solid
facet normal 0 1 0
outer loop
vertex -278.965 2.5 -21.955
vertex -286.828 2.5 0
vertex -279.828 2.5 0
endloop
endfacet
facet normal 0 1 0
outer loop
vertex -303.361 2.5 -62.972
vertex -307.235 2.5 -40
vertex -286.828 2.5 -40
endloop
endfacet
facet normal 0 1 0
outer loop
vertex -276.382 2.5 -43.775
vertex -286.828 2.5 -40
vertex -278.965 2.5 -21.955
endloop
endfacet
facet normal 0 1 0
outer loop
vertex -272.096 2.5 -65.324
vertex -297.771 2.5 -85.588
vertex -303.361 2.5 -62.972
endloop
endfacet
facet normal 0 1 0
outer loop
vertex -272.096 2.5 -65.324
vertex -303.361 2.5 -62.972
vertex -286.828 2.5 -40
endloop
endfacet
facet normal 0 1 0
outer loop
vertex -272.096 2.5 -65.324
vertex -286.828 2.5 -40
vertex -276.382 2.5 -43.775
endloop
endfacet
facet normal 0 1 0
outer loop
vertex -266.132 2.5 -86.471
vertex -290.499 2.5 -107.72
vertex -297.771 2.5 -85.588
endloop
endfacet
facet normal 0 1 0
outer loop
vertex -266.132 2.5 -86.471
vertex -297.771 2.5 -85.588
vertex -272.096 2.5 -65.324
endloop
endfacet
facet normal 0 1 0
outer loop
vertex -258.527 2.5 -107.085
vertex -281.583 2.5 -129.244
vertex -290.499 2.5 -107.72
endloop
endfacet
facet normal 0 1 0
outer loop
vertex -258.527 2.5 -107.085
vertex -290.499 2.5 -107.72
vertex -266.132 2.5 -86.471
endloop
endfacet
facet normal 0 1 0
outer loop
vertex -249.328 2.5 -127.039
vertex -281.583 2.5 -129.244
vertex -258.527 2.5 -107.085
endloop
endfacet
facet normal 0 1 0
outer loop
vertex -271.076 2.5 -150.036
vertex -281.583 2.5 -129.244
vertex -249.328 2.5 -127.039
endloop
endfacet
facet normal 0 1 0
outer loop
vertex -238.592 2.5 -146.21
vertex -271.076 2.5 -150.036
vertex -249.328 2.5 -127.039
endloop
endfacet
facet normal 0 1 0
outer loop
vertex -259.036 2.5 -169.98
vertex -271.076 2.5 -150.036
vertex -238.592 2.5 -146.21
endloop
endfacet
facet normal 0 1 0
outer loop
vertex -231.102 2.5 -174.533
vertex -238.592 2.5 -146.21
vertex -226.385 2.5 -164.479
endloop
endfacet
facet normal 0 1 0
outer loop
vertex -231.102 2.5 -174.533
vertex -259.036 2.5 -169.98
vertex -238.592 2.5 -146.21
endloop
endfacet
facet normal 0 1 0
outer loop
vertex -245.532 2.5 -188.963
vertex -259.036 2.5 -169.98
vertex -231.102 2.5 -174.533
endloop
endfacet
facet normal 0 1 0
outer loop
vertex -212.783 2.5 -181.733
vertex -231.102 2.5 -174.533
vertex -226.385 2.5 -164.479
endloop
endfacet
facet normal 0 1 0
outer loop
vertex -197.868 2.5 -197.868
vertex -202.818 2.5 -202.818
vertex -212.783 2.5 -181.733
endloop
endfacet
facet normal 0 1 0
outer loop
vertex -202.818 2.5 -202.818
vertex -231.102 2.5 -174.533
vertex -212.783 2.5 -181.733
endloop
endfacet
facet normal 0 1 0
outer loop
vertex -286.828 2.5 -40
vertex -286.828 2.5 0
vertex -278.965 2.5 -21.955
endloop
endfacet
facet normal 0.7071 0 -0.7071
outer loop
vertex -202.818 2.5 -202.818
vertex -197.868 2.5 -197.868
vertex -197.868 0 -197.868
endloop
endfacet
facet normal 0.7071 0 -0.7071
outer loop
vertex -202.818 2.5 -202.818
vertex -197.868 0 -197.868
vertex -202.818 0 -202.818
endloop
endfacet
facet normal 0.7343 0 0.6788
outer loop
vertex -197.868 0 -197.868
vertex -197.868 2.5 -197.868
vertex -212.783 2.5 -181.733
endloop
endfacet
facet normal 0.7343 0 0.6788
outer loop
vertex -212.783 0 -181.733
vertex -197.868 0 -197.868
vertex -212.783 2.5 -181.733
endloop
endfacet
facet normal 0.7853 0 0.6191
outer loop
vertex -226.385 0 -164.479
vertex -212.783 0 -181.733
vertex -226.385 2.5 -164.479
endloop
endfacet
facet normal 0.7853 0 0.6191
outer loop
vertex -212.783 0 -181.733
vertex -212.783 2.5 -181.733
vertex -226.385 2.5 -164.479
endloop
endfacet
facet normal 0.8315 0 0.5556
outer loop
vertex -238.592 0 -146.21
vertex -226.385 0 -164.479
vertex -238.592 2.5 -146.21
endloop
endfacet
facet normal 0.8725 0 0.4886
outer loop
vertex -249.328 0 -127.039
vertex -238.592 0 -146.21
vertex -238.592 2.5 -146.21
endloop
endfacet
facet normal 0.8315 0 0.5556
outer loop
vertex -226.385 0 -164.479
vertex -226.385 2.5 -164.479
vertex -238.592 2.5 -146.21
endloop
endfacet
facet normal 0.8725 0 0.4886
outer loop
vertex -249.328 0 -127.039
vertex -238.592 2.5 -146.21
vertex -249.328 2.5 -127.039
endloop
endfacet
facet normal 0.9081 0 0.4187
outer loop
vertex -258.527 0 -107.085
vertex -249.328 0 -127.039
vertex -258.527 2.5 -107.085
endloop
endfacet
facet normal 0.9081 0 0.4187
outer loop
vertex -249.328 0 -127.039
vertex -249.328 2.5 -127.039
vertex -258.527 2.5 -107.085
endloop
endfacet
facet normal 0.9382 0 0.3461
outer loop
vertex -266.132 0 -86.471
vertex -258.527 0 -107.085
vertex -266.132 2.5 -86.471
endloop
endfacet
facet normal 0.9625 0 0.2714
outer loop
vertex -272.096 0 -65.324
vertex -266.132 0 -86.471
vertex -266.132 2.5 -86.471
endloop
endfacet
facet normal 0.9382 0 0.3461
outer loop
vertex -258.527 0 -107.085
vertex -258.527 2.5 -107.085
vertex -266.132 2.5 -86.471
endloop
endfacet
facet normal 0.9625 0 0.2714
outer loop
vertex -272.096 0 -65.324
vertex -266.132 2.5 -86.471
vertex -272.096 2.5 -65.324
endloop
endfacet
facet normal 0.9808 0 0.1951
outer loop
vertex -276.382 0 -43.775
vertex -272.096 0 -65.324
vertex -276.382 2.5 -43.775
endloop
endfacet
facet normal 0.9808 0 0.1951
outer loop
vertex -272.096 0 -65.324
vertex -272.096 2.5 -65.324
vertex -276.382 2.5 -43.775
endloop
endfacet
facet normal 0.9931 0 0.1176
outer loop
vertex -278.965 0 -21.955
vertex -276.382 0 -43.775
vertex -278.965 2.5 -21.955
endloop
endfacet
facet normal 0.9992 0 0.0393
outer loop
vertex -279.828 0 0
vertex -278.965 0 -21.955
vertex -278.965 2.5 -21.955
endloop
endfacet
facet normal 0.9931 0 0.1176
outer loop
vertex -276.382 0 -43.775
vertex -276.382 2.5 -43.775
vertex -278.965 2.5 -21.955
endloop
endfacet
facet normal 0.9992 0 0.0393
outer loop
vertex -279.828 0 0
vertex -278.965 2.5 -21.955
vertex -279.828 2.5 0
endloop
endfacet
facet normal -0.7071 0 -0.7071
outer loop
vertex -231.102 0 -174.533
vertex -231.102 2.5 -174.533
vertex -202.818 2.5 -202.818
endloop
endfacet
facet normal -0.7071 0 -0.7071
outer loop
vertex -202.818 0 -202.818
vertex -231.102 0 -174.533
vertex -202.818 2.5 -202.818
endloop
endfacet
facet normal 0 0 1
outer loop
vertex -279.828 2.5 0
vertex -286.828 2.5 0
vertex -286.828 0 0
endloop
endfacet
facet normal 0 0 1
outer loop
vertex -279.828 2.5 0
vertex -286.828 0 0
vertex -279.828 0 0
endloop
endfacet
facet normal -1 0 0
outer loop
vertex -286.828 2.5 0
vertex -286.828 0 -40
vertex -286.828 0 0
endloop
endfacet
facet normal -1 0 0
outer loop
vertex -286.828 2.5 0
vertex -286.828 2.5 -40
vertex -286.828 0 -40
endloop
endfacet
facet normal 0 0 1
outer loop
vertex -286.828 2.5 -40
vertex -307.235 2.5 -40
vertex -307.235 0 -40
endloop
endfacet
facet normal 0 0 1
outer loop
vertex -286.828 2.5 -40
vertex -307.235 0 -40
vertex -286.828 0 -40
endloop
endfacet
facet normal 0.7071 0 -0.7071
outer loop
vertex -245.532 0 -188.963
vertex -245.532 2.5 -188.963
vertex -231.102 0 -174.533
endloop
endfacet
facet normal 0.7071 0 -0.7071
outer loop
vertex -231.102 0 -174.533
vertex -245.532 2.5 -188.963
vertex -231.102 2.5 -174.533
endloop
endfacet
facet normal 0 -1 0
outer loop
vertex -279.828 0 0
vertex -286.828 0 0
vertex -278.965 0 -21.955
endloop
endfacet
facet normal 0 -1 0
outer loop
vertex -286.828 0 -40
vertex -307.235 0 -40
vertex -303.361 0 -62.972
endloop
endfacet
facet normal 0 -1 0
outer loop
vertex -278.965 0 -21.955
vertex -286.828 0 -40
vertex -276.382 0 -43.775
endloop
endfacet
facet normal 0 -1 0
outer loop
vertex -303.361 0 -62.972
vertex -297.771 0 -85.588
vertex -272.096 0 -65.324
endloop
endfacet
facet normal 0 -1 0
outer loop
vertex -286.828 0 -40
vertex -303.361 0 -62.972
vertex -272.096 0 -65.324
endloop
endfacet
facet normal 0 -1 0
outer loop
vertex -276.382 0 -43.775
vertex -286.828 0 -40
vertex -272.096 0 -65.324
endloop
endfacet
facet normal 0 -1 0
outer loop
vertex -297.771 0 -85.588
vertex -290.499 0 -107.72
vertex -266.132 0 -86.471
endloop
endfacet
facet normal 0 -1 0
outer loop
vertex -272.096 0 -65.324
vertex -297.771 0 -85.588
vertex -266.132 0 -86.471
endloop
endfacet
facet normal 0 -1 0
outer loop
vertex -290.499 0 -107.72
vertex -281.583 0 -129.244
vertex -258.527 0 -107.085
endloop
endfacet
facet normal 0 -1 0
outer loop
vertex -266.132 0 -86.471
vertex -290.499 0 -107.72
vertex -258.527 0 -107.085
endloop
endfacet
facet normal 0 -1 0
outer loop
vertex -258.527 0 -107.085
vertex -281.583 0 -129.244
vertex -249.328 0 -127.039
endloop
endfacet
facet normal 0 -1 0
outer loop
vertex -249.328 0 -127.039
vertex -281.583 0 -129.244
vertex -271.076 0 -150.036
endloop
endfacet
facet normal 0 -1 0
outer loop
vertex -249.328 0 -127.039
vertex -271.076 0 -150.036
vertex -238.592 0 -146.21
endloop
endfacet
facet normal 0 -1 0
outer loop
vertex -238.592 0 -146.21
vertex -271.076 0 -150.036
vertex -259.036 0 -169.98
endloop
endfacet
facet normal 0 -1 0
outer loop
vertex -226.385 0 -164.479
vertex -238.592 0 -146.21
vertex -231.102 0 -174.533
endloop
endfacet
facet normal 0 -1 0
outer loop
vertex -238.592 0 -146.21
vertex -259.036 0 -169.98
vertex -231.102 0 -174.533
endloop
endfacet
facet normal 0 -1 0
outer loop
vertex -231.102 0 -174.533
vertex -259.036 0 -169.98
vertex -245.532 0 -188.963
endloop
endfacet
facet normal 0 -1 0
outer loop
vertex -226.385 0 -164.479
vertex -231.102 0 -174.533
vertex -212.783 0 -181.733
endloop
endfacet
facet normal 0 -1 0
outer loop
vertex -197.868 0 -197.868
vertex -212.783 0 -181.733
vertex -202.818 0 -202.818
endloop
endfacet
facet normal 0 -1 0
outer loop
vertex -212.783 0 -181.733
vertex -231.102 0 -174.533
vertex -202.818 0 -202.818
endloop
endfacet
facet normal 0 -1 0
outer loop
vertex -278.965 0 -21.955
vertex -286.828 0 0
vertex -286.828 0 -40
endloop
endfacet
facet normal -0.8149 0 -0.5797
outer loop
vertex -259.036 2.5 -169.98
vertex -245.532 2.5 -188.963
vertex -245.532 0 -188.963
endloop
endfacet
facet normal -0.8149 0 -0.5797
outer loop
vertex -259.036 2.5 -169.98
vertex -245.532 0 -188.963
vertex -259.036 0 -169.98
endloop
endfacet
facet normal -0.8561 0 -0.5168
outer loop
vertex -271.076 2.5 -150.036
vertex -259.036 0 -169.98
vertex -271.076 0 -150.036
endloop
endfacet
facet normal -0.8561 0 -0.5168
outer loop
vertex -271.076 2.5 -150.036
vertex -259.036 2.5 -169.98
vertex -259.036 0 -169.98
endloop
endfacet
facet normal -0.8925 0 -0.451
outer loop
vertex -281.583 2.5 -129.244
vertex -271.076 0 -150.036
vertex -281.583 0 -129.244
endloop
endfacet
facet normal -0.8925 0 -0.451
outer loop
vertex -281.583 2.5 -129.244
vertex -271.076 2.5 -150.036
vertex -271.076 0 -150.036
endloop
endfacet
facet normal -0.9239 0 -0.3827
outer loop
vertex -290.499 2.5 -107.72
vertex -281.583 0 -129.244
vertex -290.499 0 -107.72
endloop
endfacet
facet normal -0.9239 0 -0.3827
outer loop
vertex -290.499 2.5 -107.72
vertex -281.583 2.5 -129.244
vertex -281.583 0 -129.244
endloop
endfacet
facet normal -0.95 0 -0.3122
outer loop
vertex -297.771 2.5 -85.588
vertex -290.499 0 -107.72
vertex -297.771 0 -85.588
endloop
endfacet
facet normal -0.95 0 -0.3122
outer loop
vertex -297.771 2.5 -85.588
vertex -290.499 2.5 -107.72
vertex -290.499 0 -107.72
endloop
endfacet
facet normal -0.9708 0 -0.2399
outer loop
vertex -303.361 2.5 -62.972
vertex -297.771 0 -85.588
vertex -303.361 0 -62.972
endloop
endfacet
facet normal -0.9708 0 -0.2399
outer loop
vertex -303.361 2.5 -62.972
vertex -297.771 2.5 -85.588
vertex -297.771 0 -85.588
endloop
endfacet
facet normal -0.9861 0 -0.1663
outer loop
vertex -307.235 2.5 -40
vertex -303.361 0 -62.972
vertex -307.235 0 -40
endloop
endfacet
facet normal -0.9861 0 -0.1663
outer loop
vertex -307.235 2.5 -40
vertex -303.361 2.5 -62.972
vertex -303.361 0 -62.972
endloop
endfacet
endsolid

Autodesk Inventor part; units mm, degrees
ref_plane "YZ Plane" through (0, 0, 0) normal (1, 0, 0) x (0, 1, 0)
ref_plane "XZ Plane" through (0, 0, 0) normal (0, 1, 0) x (-1, 0, 0)
ref_plane "XY Plane" through (0, 0, 0) normal (0, 0, 1) x (1, 0, 0)
sketch "スケッチ1" plane through (0, 0, 0) normal (0, 1, 0) x (-1, 0, 0)
  circle A0 centre (0, 0) radius 178.1675
  circle A1 centre (0, 0) radius 157.8276
  line L0 (168.1877, 0) -> (166.7488, -21.9529)
  line L1 (168.1877, 0) -> (130.1721, 2.4917) construction
  line L2 (249.4344, 0) -> (-249.4344, 0) projected
  line L3 (166.7488, -21.9529) -> (156.7702, -21.2989)
  line L4 (156.7702, -21.2989) -> (158.2091, 0.654) construction
  line L5 (158.2091, 0.654) -> (168.1877, 0)
  line L6 (157.4896, -10.3224) -> (0, 0)
  line L7 (166.7488, -21.9529) -> (162.4568, -43.5302)
  line L8 (162.4568, -43.5302) -> (152.649, -41.5793) construction
  line L9 (152.649, -41.5793) -> (156.9409, -20.002) construction
  line L10 (156.9409, -20.002) -> (166.7488, -21.9529) construction
  line L11 (162.4568, -43.5302) -> (155.3851, -64.3626)
  line L12 (155.3851, -64.3626) -> (145.9158, -61.1482) construction
  line L13 (145.9158, -61.1482) -> (152.9875, -40.3158) construction
  line L14 (152.9875, -40.3158) -> (162.4568, -43.5302) construction
  line L15 (155.3851, -64.3626) -> (145.6548, -84.0938)
  line L16 (145.6548, -84.0938) -> (136.6861, -79.6709) construction
  line L17 (136.6861, -79.6709) -> (146.4164, -59.9397) construction
  line L18 (146.4164, -59.9397) -> (155.3851, -64.3626) construction
  line L19 (0, 0) -> (111.6009, -111.6009)
  line L20 (145.6548, -84.0938) -> (137.3401, -78.5381) construction
  line L21 (137.3401, -78.5381) -> (125.1176, -96.8305) construction
  line L22 (125.1176, -96.8305) -> (133.4323, -102.3862) construction
  line L23 (133.4323, -102.3862) -> (145.6548, -84.0938)
  line L24 (133.4323, -102.3862) -> (125.9139, -95.7927) construction
  line L25 (125.9139, -95.7927) -> (111.4082, -112.3332) construction
  line L26 (111.4082, -112.3332) -> (118.9266, -118.9266)
  line L27 (118.9266, -118.9266) -> (133.4323, -102.3862)
  line L28 (111.6009, -111.6009) -> (118.9266, -118.9266)
  line L29 (166.7488, -21.9529) -> (176.7274, -22.6069) construction
  line L30 (118.9266, -118.9266) -> (125.9834, -125.9834)
  point P0 (154.795, -30.7906)
  point P1 (149.4517, -50.732)
  point P2 (141.5512, -69.8053)
  point P3 (131.2288, -87.6843)
  point P4 (118.661, -104.0629)
  point P5 (157.8276, 0)
  point P6 (178.1675, 0)
  dimension "d0" = 22
  dimension "d1" = 10
  dimension "d2" = 45
  dimension "d4" = 315.6551
extrude "押し出し1" add sketch "スケッチ1" along normal blind 2.5 contours L30 L27 L23 L15 L11 L7 L0 L2 A0 | L28 A1 L2 L0 L7 L11 L15 L23 L27
sketch "スケッチ2" plane through (0, 2.5, 0) normal (0, 1, 0) x (1, 0, 0)
  circle A0 centre (0, 0) radius 309.8276
  line L0 (-168.1877, 0) -> (-166.7488, 21.9529) projected
  line L1 (-166.7488, 21.9529) -> (-162.4568, 43.5302) projected
  line L2 (-162.4568, 43.5302) -> (-155.3851, 64.3626) projected
  line L3 (-155.3851, 64.3626) -> (-145.6548, 84.0938) projected
  line L4 (-133.4323, 102.3862) -> (-145.6548, 84.0938) projected
  line L5 (-118.9266, 118.9266) -> (-133.4323, 102.3862) projected
  line L6 (-167.4682, 10.9764) -> (-166.0294, 32.9293)
  line L7 (-166.0294, 32.9293) -> (-275.7938, 40.1237)
  line L8 (-275.7938, 40.1237) -> (-277.2327, 18.1708)
  line L9 (-277.2327, 18.1708) -> (-167.4682, 10.9764)
  line L10 (-164.6028, 32.7415) -> (-160.3108, 54.3188)
  line L11 (-160.3108, 54.3188) -> (-268.1972, 75.7787)
  line L12 (-268.1972, 75.7787) -> (-272.4892, 54.2015)
  line L13 (-272.4892, 54.2015) -> (-164.6028, 32.7415)
  circle A1 centre (-166.7488, 21.9529) radius 11
  circle A2 centre (-162.4568, 43.5302) radius 11
  line L14 (-158.921, 53.9464) -> (-151.8493, 74.7789)
  line L15 (-151.8493, 74.7789) -> (-256.0116, 110.1372)
  line L16 (-256.0116, 110.1372) -> (-263.0833, 89.3047)
  line L17 (-263.0833, 89.3047) -> (-158.921, 53.9464)
  circle A3 centre (-155.3851, 64.3626) radius 11
  arc A4 (-275.7591, 62.4834) -> (-281.3553, 41.7349) centre (-166.7488, 21.9529) ccw
  line L18 (-178.1663, 0.654) -> (-158.2091, -0.654)
  line L19 (-158.2091, -0.654) -> (-156.7702, 21.2989)
  line L20 (-156.7702, 21.2989) -> (-176.7274, 22.6069)
  line L21 (-176.7274, 22.6069) -> (-178.1663, 0.654)
  line L22 (-177.4468, 11.6305) -> (-275.7938, 40.1237)
  line L23 (-176.7274, 22.6069) -> (-176.008, 33.5834)
  line L24 (-176.008, 33.5834) -> (-275.7591, 62.4834)
  line L25 (-275.7938, 40.1237) -> (-281.3553, 41.7349)
  circle A5 centre (0, 0) radius 137.8276
  line L26 (0, 0) -> (-219.0812, 219.0812)
  line L27 (-111.6009, 111.6009) -> (-125.9834, 125.9834) projected
  line L28 (-433.7586, 0) -> (433.7586, 0) projected
  circle A6 centre (0, 0) radius 279.8276 construction
  arc A7 (-111.6009, 111.6009) -> (-157.8276, 0) centre (0, 0) ccw projected
  point P0 (-158.1662, 0)
  point P1 (-137.8276, 0)
  point P2 (-97.4588, 97.4588)
  point P3 (-309.8276, 0)
  dimension "d7" = 22
  dimension "d10" = 20
  dimension "d11" = 100
  dimension "d12" = 30
  dimension "d14" = 20
  dimension "d17" = 122
extrude "押し出し2" add sketch "スケッチ2" against normal blind 2.5 contours L26 L5 L4 L3 A3 L15 L16 L17 A2 L11 L12 L24 A4 L25 L8 L9 L21 L18 L28 A0 | L18 L21 L9 L0 | L0 A1 L19 L28 | A5 L28 A7 A1 A2 A3 L26 | L26 A7 A3 L3 L4 L5 | A1 L21 L20 L0 | L9 L21 A1 | L0 L20 L19 A1 | L19 A7 L28 | L6 A1 L1 | L20 L23 A1 L6 | L1 A1 A7 L19 L20 | L22 L7 L23 A1 L21 | L9 L8 L22 | A1 L23 L21 | A1 A7 L19 | A7 A3 L2 L3 | A3 A7 | A2 L10 L1 | A1 L7 L24 L13 | A2 A7 A1 | L13 L24 L12 L11 A2 | L1 L2 A2 A7 | A1 L23 L7 | L25 A4 L24 L12 L13 L7 | A7 A1 | A7 A2 A3 | L3 L14 A3 | L10 A2 L2 | L13 L12 L24 | A7 A2 | A3 L14 L2 | L17 L16 L15 A3
sketch "スケッチ3" plane through (0, 2.5, 0) normal (0, 1, 0) x (1, 0, 0)
  circle A0 centre (0, 0) radius 279.8276
  arc A1 (-97.4588, 97.4588) -> (-137.8276, 0) centre (0, 0) ccw projected
  line L0 (-97.4588, 97.4588) -> (-219.0812, 219.0812) projected
  line L1 (-309.8276, 0) -> (-137.8276, 0) projected
  arc A2 (-219.0812, 219.0812) -> (-309.8276, 0) centre (0, 0) ccw projected
  point P0 (-279.8276, 0)
  point P1 (-197.868, 197.868)
  dimension "d21" = 30
extrude "押し出し3" cut sketch "スケッチ3" against normal through all contours L0 A1 L1 A0 picked at (-201.5408, 115.5258)
sketch "スケッチ4" plane through (0, 2.5, 0) normal (0, 1, 0) x (1, 0, 0)
  line L0 (-279.8276, 0) -> (-309.8276, 0) projected
  line L1 (-286.8276, 0) -> (-309.8276, 0)
  line L2 (-309.8276, 0) -> (-309.8276, 40)
  line L3 (-309.8276, 40) -> (-286.8276, 40)
  line L4 (-286.8276, 40) -> (-286.8276, 0)
  line L5 (0, 0) -> (-232.1993, 96.1801) construction
  line L6 (-371.7931, 0) -> (61.9655, 0) projected
  line L7 (-197.868, 197.868) -> (-219.0812, 219.0812)
  line L8 (-202.8177, 202.8177) -> (-219.0812, 219.0812)
  line L9 (-219.0812, 219.0812) -> (-247.3654, 190.7969)
  line L10 (-247.3654, 190.7969) -> (-231.102, 174.5334)
  line L11 (-231.102, 174.5334) -> (-202.8177, 202.8177)
  dimension "d22" = 23
  dimension "d23" = 40
  dimension "d26" = 22.5
extrude "押し出し4" cut sketch "スケッチ4" against normal through all
properties part number "front_upper" material "木材 (カエデ材)"
